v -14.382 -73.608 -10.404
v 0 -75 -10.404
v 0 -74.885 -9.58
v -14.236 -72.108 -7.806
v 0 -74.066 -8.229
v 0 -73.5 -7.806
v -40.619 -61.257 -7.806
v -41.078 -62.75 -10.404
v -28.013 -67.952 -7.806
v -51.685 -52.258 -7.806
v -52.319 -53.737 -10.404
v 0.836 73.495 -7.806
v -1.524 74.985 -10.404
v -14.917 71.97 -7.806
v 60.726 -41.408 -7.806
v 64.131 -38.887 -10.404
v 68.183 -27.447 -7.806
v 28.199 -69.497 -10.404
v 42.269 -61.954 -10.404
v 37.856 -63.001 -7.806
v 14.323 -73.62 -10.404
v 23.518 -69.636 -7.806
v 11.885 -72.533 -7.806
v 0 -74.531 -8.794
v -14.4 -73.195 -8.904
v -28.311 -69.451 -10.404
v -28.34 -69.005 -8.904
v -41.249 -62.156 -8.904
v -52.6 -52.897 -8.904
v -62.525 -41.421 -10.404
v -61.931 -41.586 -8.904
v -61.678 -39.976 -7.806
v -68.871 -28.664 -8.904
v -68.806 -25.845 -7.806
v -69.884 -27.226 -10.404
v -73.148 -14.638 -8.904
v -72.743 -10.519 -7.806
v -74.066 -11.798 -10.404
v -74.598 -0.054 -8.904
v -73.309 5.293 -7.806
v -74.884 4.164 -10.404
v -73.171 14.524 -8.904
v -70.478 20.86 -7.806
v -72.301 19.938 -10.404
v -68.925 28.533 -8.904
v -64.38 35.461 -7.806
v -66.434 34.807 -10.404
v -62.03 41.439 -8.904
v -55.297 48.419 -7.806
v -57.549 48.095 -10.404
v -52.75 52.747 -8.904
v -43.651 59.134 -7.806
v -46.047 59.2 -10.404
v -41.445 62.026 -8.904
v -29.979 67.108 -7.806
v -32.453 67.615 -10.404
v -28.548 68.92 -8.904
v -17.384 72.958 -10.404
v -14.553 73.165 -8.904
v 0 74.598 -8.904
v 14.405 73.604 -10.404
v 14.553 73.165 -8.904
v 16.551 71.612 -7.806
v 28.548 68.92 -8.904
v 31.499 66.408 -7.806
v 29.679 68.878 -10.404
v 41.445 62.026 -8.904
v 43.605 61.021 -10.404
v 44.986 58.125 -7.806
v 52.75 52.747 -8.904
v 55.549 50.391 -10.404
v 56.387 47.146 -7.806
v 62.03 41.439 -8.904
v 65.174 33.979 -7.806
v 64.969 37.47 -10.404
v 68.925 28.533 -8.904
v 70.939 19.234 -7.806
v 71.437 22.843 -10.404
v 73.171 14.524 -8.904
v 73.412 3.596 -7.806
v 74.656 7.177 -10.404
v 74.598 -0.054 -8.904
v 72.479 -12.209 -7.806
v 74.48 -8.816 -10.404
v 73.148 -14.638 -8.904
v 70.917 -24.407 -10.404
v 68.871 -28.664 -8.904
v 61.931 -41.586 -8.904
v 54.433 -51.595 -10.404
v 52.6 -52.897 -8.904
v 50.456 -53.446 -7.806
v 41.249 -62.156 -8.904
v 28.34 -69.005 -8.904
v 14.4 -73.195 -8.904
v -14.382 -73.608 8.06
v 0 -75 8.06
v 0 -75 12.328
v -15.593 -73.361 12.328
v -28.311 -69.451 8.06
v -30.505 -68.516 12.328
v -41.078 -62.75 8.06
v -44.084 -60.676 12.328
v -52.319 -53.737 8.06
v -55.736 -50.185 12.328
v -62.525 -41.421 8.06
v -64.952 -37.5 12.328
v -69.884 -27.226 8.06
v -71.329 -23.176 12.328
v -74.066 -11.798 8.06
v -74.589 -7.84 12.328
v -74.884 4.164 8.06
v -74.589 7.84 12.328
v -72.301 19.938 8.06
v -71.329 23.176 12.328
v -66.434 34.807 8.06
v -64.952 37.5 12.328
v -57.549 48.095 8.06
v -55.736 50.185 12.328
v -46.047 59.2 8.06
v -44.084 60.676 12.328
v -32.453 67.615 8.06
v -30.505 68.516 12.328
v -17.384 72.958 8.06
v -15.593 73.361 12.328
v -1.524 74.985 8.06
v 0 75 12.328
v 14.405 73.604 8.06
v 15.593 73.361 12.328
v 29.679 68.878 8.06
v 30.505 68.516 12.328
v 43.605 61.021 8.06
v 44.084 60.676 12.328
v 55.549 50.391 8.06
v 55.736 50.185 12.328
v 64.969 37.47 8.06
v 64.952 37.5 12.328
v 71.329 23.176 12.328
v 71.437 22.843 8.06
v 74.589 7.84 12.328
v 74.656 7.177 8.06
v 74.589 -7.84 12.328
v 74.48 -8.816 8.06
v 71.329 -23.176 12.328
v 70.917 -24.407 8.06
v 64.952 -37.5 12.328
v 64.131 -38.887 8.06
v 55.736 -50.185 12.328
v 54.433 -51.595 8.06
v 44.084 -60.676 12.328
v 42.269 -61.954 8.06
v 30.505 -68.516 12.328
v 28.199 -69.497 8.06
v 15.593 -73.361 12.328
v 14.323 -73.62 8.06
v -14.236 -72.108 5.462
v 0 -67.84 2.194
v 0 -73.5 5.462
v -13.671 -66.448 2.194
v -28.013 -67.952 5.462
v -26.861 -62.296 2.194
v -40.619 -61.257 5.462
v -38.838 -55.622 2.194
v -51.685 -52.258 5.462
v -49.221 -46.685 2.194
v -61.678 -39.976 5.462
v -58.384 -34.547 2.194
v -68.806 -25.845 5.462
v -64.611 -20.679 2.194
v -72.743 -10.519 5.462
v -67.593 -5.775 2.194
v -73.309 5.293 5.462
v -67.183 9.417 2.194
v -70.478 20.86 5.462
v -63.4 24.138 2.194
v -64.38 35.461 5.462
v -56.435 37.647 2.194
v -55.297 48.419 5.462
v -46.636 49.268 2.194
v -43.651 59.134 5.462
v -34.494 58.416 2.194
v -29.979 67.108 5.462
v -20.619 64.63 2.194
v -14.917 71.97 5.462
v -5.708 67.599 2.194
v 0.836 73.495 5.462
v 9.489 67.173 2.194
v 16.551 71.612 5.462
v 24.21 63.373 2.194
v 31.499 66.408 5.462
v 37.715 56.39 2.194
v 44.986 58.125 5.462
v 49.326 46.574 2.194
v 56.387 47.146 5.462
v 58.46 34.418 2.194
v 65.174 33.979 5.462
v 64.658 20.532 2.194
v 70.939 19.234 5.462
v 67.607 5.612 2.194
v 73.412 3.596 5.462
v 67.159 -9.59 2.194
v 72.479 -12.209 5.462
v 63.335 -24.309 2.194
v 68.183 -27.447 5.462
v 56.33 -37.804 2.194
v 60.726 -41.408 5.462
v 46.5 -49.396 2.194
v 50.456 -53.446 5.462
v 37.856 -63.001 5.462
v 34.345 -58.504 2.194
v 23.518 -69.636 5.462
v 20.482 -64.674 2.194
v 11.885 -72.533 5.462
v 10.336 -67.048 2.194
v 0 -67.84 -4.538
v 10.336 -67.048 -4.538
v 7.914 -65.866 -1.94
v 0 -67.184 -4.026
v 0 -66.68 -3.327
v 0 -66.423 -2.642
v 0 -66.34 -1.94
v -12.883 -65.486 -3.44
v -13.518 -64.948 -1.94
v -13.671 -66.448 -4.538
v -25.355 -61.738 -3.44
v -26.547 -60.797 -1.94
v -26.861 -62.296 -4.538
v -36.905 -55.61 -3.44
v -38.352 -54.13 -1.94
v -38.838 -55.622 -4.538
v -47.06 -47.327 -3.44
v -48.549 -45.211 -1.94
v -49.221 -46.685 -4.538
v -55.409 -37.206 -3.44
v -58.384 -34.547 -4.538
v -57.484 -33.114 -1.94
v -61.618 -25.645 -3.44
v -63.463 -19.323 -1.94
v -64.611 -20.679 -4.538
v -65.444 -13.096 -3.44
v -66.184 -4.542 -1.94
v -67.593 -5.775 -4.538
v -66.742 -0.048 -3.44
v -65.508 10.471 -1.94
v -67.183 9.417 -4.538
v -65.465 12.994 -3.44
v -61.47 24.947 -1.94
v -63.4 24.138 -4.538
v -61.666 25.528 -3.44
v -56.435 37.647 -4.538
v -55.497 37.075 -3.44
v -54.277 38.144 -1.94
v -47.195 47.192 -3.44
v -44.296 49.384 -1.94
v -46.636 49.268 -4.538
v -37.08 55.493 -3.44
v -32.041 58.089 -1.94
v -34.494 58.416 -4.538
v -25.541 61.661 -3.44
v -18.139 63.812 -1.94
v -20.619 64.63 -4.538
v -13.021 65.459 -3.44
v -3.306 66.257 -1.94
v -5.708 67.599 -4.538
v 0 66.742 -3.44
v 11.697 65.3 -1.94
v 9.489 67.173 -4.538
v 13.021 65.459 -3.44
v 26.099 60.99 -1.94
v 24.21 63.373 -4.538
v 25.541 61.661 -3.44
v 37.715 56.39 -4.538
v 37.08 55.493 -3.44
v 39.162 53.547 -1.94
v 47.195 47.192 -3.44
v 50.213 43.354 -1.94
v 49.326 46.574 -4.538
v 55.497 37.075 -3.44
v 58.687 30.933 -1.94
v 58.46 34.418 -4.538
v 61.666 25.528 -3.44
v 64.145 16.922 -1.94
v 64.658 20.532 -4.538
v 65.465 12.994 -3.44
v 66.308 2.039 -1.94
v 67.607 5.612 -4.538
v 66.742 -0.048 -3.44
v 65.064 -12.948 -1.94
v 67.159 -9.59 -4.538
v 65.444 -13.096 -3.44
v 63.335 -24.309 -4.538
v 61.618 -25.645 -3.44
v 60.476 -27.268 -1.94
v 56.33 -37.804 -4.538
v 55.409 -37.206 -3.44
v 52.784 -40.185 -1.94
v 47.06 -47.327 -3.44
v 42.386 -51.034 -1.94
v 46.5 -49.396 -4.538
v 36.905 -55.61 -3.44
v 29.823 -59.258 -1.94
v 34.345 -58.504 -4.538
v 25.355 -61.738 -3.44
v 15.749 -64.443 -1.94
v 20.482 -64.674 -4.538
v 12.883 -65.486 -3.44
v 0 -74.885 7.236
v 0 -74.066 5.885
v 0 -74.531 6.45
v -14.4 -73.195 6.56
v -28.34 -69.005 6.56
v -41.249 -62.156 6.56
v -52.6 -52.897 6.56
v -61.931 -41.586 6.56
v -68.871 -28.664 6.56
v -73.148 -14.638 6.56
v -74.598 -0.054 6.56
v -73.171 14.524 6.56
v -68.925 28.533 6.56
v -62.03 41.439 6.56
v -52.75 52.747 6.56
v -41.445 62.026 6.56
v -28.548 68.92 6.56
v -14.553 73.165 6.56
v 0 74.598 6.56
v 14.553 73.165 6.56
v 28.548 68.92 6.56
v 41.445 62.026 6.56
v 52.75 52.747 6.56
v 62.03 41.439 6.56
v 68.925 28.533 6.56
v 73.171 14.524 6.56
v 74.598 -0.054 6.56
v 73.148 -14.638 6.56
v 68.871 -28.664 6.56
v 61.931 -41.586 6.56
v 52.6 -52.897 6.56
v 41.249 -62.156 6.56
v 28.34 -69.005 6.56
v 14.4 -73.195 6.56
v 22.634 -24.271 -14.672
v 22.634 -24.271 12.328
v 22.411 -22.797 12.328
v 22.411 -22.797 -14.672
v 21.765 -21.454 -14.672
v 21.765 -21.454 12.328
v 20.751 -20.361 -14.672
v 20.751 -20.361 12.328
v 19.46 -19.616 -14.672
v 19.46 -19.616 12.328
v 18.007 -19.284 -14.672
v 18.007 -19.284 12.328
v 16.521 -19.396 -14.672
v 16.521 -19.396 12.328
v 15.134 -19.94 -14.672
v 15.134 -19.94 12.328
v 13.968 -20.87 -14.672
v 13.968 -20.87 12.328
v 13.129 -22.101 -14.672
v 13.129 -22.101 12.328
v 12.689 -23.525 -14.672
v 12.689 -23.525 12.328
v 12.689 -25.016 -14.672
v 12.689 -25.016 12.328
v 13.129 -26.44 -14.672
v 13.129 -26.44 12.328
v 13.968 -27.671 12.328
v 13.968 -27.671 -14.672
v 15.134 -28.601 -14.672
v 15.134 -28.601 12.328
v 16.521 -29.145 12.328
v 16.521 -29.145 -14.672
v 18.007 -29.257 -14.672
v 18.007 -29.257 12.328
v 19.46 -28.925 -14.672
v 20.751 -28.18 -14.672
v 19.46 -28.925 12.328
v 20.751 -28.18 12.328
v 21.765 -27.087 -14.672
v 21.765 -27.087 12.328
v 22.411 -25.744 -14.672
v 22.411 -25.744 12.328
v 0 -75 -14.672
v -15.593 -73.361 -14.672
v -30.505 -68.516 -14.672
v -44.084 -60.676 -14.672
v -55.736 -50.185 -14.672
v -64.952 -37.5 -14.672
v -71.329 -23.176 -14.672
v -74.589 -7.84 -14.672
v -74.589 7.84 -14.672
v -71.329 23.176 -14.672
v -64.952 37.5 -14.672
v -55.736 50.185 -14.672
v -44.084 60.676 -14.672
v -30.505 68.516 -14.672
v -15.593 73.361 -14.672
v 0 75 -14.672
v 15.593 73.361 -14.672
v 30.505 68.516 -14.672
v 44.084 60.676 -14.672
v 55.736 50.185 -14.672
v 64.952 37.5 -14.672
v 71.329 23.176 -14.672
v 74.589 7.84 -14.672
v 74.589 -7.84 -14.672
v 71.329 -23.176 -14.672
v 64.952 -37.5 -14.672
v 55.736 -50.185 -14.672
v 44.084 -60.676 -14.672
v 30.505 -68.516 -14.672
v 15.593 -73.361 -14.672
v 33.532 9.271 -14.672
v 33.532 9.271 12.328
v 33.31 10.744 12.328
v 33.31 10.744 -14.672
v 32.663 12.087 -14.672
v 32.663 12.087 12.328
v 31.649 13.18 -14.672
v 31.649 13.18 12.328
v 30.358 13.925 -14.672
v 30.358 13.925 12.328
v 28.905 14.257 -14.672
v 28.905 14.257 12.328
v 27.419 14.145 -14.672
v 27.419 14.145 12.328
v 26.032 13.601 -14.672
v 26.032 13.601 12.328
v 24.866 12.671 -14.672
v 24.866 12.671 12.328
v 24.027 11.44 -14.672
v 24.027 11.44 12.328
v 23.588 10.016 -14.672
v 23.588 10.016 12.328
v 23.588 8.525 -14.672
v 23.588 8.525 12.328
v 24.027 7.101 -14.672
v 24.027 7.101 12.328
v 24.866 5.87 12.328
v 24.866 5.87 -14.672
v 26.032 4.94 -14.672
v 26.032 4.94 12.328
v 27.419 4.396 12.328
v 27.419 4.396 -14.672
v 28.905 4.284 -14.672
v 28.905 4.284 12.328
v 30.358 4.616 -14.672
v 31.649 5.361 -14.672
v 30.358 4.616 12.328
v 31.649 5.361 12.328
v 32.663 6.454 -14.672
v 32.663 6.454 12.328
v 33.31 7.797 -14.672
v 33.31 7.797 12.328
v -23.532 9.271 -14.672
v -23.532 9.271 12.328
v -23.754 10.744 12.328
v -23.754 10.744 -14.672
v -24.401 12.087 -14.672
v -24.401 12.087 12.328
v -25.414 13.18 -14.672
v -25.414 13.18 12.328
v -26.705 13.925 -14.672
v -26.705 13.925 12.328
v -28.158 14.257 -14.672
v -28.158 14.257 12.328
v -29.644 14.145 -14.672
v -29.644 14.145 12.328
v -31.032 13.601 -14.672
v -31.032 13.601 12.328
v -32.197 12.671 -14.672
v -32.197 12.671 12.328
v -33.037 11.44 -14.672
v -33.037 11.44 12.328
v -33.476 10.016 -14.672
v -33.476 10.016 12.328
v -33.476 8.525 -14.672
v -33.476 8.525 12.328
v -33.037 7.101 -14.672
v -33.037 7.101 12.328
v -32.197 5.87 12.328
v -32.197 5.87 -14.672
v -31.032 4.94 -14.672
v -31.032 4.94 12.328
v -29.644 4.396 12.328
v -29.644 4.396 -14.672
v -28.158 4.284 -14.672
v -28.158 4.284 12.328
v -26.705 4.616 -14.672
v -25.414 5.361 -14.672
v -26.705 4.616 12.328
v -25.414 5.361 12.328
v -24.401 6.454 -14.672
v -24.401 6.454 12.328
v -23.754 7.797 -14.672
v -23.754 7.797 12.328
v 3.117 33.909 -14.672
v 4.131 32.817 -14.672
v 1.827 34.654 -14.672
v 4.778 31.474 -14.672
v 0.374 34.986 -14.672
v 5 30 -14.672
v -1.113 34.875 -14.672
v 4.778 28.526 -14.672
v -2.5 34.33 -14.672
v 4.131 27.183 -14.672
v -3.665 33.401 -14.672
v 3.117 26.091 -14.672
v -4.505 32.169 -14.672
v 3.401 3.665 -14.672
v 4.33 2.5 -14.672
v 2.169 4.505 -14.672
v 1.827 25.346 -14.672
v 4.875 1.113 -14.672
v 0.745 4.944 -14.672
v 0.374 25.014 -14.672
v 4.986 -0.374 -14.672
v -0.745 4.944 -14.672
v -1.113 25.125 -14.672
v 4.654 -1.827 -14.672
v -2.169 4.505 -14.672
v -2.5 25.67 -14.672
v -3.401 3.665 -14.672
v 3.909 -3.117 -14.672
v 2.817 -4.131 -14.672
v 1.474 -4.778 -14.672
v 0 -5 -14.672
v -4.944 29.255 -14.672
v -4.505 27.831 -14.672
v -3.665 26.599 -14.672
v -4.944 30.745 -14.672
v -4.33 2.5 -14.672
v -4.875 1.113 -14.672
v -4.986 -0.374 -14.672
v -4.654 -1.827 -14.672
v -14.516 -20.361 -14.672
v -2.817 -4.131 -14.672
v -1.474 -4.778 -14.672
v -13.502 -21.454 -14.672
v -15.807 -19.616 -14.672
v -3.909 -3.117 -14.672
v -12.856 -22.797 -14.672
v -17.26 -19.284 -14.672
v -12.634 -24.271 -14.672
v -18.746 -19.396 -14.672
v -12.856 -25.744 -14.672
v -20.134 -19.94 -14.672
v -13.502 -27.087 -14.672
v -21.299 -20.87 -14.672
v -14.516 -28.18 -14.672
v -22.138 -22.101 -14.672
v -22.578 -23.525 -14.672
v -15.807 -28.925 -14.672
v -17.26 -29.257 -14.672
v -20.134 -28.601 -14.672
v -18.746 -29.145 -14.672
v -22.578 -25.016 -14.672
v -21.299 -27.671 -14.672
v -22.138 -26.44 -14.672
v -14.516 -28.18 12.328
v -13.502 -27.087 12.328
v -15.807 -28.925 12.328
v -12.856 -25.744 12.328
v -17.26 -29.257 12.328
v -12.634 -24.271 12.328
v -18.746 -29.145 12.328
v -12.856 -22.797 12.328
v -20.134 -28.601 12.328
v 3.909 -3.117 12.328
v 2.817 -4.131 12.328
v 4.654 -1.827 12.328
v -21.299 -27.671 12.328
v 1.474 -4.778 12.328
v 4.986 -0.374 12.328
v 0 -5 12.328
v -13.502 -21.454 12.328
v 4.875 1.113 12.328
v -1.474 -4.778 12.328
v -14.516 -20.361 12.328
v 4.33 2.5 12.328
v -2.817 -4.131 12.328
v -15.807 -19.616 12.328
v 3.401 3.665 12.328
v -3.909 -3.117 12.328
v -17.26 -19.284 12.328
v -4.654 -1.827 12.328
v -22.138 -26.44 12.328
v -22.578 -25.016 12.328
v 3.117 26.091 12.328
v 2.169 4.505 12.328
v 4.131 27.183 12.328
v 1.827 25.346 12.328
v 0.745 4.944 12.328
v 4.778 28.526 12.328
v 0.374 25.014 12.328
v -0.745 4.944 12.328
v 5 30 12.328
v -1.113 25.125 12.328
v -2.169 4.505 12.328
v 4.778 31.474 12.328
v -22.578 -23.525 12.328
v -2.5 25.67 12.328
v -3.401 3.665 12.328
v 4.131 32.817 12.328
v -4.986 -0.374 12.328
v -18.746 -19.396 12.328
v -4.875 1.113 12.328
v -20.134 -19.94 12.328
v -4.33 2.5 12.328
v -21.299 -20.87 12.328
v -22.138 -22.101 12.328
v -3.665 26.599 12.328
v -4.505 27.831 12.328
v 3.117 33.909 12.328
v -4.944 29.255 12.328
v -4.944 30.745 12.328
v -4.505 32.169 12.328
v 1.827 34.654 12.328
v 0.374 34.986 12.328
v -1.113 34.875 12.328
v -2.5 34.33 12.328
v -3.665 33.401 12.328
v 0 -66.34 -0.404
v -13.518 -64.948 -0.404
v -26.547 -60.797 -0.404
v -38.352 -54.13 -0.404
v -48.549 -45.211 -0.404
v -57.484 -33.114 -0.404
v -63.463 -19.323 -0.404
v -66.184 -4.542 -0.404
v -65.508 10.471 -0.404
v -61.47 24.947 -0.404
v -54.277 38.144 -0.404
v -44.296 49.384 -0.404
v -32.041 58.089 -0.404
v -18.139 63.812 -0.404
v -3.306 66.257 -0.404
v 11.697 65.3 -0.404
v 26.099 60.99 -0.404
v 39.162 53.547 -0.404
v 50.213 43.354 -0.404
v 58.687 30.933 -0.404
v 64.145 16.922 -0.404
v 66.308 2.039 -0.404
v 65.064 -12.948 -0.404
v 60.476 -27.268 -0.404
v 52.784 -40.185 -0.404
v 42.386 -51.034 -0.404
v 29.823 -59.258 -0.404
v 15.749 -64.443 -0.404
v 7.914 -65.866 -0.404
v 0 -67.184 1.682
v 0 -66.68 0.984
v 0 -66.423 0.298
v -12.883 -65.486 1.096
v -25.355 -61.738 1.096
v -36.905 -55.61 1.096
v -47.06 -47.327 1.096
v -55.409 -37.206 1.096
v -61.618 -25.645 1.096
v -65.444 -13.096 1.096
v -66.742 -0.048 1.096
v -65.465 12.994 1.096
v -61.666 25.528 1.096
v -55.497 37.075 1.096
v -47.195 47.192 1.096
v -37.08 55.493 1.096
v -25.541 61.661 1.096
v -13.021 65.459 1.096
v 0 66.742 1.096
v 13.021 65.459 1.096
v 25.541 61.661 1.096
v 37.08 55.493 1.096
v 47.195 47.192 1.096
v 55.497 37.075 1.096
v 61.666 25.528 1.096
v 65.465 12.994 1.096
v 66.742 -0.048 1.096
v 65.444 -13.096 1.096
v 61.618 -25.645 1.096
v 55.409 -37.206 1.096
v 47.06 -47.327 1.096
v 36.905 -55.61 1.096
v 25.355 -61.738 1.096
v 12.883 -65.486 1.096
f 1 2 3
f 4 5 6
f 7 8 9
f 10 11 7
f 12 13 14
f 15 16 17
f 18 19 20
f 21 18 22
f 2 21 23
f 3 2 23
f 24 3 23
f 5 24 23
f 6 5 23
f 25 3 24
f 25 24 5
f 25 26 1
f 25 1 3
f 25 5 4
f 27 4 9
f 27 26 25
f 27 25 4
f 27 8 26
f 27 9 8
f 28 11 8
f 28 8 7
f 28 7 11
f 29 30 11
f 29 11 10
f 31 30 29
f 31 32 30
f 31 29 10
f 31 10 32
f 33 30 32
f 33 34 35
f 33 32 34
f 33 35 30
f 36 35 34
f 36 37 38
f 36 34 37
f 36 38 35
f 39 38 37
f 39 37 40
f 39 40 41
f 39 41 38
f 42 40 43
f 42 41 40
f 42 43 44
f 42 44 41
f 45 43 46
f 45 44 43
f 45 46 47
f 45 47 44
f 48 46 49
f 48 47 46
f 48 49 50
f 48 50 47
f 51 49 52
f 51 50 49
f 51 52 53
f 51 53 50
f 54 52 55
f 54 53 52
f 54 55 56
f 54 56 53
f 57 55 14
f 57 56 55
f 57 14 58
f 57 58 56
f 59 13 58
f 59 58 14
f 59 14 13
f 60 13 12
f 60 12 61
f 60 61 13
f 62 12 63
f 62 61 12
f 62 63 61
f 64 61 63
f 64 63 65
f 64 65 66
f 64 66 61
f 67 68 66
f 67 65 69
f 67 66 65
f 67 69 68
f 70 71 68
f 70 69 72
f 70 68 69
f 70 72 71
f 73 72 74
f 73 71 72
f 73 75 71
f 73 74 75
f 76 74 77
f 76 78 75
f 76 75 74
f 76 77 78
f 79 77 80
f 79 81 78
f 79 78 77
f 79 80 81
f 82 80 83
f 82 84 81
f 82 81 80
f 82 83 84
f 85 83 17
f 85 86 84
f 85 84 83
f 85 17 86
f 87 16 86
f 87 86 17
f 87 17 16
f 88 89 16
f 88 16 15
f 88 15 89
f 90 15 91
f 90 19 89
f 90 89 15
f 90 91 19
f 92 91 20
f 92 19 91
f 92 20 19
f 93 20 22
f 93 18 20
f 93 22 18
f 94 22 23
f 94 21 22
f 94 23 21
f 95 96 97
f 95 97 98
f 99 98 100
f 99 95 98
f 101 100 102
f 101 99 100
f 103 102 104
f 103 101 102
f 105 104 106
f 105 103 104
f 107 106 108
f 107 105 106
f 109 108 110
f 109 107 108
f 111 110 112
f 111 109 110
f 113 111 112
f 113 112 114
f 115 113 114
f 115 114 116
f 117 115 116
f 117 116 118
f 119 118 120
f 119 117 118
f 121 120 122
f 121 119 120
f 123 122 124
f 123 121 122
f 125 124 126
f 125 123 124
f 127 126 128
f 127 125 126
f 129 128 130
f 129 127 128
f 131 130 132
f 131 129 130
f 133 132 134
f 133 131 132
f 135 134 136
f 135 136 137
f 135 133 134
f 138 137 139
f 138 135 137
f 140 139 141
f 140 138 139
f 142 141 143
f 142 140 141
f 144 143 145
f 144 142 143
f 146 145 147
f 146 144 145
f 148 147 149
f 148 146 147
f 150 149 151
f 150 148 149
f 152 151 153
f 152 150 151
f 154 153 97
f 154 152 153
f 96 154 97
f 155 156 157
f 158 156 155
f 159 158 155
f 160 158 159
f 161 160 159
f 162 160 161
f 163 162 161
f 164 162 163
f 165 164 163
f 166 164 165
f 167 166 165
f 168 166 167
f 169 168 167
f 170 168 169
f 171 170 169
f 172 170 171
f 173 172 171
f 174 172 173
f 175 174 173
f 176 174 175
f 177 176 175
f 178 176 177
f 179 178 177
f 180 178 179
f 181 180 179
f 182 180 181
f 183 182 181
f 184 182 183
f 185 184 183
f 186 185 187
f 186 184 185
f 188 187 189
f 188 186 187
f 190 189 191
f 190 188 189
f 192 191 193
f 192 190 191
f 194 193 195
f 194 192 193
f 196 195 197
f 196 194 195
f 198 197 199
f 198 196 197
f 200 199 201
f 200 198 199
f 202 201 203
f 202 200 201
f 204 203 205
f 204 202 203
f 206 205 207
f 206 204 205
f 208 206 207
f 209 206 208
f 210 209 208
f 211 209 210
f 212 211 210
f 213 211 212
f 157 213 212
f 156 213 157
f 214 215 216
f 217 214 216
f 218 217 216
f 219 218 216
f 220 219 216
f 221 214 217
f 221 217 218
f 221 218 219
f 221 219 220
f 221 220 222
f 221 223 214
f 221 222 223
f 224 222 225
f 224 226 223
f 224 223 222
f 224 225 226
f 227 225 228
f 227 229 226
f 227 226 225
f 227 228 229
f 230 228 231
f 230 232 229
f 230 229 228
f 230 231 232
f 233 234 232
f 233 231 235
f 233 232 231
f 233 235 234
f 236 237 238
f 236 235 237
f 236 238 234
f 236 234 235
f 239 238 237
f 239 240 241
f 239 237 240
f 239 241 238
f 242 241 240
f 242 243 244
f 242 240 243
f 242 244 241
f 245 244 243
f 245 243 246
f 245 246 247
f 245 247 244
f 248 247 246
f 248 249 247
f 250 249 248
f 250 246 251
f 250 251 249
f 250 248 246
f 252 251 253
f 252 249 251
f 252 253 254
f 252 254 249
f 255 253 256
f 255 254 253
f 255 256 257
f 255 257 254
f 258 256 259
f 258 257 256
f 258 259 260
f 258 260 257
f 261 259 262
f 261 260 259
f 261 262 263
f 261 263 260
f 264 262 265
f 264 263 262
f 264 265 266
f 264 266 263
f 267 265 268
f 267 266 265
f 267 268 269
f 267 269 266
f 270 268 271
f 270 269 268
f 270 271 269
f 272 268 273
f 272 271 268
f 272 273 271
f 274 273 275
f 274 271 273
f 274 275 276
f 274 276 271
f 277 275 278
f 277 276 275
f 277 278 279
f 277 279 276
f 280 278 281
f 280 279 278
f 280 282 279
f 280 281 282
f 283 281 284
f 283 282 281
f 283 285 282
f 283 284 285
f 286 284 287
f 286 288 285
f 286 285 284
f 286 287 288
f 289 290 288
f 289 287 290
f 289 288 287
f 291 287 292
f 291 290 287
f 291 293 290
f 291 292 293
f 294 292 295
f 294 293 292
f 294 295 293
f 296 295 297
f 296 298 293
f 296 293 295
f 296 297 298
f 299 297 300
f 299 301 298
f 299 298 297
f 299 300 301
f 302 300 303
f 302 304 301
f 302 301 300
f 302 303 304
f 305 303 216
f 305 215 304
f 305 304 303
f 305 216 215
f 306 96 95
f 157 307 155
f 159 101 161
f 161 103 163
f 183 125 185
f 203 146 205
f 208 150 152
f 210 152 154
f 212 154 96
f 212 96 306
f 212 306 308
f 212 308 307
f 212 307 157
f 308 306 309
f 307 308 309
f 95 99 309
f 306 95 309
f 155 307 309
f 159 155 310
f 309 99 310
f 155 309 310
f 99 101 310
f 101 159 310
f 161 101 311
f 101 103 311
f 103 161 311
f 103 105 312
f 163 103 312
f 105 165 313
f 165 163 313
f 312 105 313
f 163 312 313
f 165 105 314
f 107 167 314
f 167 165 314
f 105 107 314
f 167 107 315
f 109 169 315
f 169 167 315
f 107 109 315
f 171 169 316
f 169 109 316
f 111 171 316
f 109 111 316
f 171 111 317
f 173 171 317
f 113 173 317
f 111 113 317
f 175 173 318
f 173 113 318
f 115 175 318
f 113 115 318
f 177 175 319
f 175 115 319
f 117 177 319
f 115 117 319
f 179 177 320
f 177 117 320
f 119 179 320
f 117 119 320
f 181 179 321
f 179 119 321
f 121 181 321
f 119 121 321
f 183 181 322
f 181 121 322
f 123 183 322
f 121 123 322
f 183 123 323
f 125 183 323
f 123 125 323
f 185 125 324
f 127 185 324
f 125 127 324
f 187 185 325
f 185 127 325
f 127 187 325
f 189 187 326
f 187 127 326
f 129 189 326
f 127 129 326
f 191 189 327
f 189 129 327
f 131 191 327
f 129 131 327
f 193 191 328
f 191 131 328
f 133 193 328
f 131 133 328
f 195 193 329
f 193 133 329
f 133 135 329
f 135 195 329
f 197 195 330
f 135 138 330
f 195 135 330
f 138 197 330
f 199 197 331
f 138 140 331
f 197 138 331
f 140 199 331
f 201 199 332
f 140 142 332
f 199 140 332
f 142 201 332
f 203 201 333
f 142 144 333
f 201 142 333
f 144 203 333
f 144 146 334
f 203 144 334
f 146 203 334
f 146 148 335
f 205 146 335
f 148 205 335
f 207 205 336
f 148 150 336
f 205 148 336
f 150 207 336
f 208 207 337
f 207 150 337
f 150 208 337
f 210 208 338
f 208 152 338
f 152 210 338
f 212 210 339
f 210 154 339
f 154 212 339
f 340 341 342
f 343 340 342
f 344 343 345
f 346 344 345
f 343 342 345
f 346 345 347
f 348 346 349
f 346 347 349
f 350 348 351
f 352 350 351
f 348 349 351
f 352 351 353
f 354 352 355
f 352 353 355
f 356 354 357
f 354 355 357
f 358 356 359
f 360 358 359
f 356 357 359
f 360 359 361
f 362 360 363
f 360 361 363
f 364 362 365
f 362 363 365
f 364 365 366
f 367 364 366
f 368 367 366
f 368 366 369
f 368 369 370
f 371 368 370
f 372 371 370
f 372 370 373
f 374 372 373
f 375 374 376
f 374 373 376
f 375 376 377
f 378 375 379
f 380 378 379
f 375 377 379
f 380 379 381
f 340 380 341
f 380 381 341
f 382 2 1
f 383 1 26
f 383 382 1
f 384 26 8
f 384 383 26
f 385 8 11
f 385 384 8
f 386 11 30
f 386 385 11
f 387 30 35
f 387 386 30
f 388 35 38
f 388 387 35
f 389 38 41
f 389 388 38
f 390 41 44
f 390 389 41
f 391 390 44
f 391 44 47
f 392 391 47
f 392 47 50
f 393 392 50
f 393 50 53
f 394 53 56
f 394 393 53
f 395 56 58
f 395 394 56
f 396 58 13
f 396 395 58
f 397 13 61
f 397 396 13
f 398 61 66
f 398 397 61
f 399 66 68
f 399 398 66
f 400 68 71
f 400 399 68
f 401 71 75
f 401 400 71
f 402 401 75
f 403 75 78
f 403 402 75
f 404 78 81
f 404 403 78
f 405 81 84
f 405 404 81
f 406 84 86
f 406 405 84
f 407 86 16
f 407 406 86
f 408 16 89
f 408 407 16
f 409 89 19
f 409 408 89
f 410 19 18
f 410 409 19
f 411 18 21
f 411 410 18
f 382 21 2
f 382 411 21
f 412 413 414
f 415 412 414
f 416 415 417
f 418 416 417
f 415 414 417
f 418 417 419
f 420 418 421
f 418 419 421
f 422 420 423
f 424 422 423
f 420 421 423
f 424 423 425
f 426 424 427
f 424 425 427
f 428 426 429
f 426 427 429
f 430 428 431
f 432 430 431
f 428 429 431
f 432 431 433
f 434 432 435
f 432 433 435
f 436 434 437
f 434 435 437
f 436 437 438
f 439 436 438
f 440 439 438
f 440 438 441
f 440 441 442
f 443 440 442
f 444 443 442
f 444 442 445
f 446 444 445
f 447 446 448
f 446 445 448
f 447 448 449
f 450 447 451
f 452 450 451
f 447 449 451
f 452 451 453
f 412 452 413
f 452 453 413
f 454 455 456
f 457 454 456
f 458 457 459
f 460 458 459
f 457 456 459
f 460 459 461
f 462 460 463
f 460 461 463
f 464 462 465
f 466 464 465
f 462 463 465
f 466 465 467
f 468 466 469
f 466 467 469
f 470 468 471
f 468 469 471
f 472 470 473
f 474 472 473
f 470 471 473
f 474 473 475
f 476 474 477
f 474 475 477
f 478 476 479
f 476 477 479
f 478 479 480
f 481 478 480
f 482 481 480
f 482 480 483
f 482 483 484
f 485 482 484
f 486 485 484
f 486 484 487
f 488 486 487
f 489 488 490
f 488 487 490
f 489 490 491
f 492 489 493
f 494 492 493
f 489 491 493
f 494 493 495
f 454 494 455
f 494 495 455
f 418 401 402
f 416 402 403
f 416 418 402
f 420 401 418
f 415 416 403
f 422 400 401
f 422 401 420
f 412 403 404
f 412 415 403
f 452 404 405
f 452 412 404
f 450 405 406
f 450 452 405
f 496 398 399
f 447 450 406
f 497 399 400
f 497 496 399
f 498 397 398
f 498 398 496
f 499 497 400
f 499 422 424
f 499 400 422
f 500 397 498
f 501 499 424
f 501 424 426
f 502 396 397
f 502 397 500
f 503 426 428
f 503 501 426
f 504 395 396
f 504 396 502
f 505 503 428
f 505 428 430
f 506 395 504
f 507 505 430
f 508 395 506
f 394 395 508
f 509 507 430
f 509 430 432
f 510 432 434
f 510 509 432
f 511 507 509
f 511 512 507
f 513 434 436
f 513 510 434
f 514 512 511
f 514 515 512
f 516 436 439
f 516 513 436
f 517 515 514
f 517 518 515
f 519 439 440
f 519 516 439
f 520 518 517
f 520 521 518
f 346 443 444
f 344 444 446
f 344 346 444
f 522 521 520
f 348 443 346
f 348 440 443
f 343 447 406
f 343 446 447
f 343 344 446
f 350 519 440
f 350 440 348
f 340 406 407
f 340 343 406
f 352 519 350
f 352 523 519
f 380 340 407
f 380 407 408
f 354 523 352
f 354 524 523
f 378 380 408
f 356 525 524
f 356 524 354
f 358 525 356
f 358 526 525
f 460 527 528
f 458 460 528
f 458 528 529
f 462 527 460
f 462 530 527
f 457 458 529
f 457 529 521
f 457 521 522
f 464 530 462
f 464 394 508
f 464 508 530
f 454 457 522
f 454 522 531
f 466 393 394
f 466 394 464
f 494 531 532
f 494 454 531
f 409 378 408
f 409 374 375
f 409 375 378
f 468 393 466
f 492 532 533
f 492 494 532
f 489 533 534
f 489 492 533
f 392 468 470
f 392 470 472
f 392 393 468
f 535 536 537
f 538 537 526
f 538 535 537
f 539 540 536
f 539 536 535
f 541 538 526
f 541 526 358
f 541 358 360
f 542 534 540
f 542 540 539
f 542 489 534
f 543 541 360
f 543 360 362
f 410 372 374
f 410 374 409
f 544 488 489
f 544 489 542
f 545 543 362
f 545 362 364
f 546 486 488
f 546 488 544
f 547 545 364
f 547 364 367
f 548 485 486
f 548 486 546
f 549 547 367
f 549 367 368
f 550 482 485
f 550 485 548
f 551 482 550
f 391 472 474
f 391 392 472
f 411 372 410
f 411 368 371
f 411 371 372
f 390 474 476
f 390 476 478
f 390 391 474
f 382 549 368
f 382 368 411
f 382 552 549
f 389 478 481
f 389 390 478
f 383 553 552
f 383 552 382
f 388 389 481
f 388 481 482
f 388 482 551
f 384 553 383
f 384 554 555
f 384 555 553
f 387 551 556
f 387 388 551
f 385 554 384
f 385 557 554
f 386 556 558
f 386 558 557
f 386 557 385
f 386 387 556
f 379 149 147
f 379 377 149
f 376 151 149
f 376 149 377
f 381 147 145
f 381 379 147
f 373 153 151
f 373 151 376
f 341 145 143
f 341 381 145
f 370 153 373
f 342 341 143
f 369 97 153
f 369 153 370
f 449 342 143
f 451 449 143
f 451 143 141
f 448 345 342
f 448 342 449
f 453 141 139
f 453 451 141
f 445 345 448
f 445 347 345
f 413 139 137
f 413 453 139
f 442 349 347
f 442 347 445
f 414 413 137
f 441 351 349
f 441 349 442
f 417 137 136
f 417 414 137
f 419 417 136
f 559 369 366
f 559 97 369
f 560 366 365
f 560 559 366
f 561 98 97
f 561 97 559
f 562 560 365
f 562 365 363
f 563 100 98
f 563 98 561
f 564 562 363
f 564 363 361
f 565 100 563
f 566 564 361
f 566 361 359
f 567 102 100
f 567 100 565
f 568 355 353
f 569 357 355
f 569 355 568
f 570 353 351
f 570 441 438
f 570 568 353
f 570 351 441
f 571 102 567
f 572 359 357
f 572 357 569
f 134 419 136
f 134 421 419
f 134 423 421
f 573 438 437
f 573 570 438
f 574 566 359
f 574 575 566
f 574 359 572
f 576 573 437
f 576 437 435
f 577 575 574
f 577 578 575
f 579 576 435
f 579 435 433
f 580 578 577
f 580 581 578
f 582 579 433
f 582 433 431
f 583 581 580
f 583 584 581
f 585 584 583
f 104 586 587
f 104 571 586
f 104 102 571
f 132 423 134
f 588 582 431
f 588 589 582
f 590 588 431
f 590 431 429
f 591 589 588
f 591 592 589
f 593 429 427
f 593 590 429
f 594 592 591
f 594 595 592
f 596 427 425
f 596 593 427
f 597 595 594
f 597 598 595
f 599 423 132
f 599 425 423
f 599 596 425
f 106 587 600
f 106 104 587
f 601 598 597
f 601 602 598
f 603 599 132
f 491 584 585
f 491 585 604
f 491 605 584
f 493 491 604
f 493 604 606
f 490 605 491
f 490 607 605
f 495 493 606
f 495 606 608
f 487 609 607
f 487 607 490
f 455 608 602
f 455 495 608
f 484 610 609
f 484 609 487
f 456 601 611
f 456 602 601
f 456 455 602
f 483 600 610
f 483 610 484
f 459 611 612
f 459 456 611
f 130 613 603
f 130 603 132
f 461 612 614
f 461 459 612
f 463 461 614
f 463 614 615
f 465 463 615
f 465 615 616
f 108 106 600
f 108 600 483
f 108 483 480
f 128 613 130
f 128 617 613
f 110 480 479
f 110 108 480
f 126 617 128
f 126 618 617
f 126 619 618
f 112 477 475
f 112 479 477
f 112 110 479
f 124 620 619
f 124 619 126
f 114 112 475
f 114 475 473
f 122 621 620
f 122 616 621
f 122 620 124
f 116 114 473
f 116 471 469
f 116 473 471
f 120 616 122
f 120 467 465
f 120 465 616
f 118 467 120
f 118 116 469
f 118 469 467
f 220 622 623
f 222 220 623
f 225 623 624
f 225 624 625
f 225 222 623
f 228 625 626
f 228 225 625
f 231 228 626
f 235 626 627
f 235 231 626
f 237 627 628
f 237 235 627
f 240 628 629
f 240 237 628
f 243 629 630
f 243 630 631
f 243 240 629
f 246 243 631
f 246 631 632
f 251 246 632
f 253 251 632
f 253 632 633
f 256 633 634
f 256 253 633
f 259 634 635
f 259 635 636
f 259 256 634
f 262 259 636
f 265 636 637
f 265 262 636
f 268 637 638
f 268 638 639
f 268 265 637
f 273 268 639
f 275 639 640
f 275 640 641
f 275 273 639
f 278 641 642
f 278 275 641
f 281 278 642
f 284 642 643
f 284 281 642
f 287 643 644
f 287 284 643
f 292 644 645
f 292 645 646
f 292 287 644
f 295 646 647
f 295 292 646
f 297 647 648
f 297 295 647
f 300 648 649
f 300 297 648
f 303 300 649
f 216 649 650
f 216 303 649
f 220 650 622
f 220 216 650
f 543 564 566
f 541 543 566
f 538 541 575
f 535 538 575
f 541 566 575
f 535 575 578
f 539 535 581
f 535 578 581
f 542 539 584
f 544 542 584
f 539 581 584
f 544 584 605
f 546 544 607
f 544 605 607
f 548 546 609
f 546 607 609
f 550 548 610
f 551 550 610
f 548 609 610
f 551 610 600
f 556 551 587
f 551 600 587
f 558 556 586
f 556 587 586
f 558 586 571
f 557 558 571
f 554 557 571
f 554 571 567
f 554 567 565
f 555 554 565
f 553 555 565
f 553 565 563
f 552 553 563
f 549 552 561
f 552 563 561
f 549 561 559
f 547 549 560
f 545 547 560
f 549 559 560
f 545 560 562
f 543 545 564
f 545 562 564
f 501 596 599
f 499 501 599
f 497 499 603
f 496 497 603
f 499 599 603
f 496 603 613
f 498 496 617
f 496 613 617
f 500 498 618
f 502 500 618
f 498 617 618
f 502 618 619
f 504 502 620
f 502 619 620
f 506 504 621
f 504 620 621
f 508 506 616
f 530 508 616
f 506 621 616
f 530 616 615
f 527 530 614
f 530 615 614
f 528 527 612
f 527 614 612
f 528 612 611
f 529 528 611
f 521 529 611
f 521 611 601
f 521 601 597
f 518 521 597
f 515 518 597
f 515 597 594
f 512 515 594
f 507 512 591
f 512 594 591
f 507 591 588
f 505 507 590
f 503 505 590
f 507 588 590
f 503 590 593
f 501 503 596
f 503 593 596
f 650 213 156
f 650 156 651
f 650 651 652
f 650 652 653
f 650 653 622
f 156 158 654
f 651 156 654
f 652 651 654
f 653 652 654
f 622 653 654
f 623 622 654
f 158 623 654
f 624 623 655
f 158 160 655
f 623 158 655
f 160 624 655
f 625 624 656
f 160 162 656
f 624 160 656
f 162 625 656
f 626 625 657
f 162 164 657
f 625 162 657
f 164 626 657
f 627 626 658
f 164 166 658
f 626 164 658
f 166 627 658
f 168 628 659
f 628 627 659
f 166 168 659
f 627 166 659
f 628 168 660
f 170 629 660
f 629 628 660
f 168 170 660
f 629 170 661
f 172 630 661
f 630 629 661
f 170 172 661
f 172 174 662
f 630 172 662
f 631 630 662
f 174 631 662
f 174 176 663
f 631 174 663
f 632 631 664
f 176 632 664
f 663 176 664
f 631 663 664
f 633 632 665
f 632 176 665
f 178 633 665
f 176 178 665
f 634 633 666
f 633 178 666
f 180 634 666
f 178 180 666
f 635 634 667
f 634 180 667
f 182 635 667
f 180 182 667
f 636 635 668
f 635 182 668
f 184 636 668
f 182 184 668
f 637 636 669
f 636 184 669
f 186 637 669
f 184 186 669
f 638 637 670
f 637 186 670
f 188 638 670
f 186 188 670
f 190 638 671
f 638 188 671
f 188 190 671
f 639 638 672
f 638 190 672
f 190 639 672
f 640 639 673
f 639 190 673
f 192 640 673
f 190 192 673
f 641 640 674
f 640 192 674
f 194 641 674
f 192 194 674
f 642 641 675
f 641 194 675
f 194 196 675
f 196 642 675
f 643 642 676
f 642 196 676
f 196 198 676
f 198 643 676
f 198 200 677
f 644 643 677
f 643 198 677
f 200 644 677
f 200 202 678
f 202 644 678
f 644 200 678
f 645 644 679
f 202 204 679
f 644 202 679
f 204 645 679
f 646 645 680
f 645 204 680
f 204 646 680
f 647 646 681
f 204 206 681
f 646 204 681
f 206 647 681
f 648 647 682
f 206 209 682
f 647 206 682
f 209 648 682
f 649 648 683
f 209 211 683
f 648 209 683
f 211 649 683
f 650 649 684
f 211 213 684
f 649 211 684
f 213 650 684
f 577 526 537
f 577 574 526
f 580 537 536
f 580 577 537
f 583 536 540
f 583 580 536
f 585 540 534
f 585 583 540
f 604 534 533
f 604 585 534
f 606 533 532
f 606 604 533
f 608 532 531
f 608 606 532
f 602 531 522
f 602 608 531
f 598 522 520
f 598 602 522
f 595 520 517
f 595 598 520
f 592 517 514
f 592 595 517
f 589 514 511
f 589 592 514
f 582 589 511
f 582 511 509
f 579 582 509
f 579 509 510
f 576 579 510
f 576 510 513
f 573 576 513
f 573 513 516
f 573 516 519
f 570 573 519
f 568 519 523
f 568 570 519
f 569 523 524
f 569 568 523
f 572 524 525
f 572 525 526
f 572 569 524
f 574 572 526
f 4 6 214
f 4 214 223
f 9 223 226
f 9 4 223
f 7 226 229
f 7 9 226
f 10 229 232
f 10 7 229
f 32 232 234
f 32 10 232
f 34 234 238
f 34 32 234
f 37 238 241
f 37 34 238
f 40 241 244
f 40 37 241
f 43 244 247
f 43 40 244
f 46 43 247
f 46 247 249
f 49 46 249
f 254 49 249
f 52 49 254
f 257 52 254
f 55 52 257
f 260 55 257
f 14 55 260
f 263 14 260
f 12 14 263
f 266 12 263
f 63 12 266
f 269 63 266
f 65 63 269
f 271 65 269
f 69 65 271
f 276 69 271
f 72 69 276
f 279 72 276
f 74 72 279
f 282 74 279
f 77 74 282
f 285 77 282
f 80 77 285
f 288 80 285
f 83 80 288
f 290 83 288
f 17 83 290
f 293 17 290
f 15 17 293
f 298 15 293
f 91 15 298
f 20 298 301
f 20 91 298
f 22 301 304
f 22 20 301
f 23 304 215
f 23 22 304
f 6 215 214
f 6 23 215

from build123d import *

# Parameters (mm, degrees)
F2_R     = 5
F3_DEPTH = 27
F4_R     = 3


with BuildPart() as f1:
    # F0 (on Right) → F1 (revolve)
    with BuildSketch(Plane.YZ):
        Polygon((-5, -14.671724), (-5, 12.328276), (-75, 12.328276), (-75, 6.328276), (-66.339746, 1.328276), (-66.339746, -3.671724), (-75, -8.671724), (-75, -14.671724), align=None)
    revolve(axis=Axis((0, 0, 3.030096), (0, 0, -1)))

    # F2 (on face) → F3 (cut, through all)
    with BuildSketch(Plane.XY.offset(12.328276)):
        with Locations((-28.531695, 9.27051)):
            Circle(F2_R)
        with Locations((0, 30)):
            Circle(F2_R)
        with Locations((17.633558, -24.27051)):
            Circle(F2_R)
        with Locations((-17.633558, -24.27051)):
            Circle(F2_R)
        with Locations((28.531695, 9.27051)):
            Circle(F2_R)
    extrude(amount=-F3_DEPTH, mode=Mode.SUBTRACT)

    # F4
    f4_edges = [f1.edges().sort_by_distance(p)[0] for p in [
        (0, 75, 6.328276),
        (0, 66.339746, 1.328276),
        (0, 66.339746, -3.671724),
        (0, 75, -8.671724),
    ]]
    fillet(f4_edges, radius=F4_R)


solid = f1.part
